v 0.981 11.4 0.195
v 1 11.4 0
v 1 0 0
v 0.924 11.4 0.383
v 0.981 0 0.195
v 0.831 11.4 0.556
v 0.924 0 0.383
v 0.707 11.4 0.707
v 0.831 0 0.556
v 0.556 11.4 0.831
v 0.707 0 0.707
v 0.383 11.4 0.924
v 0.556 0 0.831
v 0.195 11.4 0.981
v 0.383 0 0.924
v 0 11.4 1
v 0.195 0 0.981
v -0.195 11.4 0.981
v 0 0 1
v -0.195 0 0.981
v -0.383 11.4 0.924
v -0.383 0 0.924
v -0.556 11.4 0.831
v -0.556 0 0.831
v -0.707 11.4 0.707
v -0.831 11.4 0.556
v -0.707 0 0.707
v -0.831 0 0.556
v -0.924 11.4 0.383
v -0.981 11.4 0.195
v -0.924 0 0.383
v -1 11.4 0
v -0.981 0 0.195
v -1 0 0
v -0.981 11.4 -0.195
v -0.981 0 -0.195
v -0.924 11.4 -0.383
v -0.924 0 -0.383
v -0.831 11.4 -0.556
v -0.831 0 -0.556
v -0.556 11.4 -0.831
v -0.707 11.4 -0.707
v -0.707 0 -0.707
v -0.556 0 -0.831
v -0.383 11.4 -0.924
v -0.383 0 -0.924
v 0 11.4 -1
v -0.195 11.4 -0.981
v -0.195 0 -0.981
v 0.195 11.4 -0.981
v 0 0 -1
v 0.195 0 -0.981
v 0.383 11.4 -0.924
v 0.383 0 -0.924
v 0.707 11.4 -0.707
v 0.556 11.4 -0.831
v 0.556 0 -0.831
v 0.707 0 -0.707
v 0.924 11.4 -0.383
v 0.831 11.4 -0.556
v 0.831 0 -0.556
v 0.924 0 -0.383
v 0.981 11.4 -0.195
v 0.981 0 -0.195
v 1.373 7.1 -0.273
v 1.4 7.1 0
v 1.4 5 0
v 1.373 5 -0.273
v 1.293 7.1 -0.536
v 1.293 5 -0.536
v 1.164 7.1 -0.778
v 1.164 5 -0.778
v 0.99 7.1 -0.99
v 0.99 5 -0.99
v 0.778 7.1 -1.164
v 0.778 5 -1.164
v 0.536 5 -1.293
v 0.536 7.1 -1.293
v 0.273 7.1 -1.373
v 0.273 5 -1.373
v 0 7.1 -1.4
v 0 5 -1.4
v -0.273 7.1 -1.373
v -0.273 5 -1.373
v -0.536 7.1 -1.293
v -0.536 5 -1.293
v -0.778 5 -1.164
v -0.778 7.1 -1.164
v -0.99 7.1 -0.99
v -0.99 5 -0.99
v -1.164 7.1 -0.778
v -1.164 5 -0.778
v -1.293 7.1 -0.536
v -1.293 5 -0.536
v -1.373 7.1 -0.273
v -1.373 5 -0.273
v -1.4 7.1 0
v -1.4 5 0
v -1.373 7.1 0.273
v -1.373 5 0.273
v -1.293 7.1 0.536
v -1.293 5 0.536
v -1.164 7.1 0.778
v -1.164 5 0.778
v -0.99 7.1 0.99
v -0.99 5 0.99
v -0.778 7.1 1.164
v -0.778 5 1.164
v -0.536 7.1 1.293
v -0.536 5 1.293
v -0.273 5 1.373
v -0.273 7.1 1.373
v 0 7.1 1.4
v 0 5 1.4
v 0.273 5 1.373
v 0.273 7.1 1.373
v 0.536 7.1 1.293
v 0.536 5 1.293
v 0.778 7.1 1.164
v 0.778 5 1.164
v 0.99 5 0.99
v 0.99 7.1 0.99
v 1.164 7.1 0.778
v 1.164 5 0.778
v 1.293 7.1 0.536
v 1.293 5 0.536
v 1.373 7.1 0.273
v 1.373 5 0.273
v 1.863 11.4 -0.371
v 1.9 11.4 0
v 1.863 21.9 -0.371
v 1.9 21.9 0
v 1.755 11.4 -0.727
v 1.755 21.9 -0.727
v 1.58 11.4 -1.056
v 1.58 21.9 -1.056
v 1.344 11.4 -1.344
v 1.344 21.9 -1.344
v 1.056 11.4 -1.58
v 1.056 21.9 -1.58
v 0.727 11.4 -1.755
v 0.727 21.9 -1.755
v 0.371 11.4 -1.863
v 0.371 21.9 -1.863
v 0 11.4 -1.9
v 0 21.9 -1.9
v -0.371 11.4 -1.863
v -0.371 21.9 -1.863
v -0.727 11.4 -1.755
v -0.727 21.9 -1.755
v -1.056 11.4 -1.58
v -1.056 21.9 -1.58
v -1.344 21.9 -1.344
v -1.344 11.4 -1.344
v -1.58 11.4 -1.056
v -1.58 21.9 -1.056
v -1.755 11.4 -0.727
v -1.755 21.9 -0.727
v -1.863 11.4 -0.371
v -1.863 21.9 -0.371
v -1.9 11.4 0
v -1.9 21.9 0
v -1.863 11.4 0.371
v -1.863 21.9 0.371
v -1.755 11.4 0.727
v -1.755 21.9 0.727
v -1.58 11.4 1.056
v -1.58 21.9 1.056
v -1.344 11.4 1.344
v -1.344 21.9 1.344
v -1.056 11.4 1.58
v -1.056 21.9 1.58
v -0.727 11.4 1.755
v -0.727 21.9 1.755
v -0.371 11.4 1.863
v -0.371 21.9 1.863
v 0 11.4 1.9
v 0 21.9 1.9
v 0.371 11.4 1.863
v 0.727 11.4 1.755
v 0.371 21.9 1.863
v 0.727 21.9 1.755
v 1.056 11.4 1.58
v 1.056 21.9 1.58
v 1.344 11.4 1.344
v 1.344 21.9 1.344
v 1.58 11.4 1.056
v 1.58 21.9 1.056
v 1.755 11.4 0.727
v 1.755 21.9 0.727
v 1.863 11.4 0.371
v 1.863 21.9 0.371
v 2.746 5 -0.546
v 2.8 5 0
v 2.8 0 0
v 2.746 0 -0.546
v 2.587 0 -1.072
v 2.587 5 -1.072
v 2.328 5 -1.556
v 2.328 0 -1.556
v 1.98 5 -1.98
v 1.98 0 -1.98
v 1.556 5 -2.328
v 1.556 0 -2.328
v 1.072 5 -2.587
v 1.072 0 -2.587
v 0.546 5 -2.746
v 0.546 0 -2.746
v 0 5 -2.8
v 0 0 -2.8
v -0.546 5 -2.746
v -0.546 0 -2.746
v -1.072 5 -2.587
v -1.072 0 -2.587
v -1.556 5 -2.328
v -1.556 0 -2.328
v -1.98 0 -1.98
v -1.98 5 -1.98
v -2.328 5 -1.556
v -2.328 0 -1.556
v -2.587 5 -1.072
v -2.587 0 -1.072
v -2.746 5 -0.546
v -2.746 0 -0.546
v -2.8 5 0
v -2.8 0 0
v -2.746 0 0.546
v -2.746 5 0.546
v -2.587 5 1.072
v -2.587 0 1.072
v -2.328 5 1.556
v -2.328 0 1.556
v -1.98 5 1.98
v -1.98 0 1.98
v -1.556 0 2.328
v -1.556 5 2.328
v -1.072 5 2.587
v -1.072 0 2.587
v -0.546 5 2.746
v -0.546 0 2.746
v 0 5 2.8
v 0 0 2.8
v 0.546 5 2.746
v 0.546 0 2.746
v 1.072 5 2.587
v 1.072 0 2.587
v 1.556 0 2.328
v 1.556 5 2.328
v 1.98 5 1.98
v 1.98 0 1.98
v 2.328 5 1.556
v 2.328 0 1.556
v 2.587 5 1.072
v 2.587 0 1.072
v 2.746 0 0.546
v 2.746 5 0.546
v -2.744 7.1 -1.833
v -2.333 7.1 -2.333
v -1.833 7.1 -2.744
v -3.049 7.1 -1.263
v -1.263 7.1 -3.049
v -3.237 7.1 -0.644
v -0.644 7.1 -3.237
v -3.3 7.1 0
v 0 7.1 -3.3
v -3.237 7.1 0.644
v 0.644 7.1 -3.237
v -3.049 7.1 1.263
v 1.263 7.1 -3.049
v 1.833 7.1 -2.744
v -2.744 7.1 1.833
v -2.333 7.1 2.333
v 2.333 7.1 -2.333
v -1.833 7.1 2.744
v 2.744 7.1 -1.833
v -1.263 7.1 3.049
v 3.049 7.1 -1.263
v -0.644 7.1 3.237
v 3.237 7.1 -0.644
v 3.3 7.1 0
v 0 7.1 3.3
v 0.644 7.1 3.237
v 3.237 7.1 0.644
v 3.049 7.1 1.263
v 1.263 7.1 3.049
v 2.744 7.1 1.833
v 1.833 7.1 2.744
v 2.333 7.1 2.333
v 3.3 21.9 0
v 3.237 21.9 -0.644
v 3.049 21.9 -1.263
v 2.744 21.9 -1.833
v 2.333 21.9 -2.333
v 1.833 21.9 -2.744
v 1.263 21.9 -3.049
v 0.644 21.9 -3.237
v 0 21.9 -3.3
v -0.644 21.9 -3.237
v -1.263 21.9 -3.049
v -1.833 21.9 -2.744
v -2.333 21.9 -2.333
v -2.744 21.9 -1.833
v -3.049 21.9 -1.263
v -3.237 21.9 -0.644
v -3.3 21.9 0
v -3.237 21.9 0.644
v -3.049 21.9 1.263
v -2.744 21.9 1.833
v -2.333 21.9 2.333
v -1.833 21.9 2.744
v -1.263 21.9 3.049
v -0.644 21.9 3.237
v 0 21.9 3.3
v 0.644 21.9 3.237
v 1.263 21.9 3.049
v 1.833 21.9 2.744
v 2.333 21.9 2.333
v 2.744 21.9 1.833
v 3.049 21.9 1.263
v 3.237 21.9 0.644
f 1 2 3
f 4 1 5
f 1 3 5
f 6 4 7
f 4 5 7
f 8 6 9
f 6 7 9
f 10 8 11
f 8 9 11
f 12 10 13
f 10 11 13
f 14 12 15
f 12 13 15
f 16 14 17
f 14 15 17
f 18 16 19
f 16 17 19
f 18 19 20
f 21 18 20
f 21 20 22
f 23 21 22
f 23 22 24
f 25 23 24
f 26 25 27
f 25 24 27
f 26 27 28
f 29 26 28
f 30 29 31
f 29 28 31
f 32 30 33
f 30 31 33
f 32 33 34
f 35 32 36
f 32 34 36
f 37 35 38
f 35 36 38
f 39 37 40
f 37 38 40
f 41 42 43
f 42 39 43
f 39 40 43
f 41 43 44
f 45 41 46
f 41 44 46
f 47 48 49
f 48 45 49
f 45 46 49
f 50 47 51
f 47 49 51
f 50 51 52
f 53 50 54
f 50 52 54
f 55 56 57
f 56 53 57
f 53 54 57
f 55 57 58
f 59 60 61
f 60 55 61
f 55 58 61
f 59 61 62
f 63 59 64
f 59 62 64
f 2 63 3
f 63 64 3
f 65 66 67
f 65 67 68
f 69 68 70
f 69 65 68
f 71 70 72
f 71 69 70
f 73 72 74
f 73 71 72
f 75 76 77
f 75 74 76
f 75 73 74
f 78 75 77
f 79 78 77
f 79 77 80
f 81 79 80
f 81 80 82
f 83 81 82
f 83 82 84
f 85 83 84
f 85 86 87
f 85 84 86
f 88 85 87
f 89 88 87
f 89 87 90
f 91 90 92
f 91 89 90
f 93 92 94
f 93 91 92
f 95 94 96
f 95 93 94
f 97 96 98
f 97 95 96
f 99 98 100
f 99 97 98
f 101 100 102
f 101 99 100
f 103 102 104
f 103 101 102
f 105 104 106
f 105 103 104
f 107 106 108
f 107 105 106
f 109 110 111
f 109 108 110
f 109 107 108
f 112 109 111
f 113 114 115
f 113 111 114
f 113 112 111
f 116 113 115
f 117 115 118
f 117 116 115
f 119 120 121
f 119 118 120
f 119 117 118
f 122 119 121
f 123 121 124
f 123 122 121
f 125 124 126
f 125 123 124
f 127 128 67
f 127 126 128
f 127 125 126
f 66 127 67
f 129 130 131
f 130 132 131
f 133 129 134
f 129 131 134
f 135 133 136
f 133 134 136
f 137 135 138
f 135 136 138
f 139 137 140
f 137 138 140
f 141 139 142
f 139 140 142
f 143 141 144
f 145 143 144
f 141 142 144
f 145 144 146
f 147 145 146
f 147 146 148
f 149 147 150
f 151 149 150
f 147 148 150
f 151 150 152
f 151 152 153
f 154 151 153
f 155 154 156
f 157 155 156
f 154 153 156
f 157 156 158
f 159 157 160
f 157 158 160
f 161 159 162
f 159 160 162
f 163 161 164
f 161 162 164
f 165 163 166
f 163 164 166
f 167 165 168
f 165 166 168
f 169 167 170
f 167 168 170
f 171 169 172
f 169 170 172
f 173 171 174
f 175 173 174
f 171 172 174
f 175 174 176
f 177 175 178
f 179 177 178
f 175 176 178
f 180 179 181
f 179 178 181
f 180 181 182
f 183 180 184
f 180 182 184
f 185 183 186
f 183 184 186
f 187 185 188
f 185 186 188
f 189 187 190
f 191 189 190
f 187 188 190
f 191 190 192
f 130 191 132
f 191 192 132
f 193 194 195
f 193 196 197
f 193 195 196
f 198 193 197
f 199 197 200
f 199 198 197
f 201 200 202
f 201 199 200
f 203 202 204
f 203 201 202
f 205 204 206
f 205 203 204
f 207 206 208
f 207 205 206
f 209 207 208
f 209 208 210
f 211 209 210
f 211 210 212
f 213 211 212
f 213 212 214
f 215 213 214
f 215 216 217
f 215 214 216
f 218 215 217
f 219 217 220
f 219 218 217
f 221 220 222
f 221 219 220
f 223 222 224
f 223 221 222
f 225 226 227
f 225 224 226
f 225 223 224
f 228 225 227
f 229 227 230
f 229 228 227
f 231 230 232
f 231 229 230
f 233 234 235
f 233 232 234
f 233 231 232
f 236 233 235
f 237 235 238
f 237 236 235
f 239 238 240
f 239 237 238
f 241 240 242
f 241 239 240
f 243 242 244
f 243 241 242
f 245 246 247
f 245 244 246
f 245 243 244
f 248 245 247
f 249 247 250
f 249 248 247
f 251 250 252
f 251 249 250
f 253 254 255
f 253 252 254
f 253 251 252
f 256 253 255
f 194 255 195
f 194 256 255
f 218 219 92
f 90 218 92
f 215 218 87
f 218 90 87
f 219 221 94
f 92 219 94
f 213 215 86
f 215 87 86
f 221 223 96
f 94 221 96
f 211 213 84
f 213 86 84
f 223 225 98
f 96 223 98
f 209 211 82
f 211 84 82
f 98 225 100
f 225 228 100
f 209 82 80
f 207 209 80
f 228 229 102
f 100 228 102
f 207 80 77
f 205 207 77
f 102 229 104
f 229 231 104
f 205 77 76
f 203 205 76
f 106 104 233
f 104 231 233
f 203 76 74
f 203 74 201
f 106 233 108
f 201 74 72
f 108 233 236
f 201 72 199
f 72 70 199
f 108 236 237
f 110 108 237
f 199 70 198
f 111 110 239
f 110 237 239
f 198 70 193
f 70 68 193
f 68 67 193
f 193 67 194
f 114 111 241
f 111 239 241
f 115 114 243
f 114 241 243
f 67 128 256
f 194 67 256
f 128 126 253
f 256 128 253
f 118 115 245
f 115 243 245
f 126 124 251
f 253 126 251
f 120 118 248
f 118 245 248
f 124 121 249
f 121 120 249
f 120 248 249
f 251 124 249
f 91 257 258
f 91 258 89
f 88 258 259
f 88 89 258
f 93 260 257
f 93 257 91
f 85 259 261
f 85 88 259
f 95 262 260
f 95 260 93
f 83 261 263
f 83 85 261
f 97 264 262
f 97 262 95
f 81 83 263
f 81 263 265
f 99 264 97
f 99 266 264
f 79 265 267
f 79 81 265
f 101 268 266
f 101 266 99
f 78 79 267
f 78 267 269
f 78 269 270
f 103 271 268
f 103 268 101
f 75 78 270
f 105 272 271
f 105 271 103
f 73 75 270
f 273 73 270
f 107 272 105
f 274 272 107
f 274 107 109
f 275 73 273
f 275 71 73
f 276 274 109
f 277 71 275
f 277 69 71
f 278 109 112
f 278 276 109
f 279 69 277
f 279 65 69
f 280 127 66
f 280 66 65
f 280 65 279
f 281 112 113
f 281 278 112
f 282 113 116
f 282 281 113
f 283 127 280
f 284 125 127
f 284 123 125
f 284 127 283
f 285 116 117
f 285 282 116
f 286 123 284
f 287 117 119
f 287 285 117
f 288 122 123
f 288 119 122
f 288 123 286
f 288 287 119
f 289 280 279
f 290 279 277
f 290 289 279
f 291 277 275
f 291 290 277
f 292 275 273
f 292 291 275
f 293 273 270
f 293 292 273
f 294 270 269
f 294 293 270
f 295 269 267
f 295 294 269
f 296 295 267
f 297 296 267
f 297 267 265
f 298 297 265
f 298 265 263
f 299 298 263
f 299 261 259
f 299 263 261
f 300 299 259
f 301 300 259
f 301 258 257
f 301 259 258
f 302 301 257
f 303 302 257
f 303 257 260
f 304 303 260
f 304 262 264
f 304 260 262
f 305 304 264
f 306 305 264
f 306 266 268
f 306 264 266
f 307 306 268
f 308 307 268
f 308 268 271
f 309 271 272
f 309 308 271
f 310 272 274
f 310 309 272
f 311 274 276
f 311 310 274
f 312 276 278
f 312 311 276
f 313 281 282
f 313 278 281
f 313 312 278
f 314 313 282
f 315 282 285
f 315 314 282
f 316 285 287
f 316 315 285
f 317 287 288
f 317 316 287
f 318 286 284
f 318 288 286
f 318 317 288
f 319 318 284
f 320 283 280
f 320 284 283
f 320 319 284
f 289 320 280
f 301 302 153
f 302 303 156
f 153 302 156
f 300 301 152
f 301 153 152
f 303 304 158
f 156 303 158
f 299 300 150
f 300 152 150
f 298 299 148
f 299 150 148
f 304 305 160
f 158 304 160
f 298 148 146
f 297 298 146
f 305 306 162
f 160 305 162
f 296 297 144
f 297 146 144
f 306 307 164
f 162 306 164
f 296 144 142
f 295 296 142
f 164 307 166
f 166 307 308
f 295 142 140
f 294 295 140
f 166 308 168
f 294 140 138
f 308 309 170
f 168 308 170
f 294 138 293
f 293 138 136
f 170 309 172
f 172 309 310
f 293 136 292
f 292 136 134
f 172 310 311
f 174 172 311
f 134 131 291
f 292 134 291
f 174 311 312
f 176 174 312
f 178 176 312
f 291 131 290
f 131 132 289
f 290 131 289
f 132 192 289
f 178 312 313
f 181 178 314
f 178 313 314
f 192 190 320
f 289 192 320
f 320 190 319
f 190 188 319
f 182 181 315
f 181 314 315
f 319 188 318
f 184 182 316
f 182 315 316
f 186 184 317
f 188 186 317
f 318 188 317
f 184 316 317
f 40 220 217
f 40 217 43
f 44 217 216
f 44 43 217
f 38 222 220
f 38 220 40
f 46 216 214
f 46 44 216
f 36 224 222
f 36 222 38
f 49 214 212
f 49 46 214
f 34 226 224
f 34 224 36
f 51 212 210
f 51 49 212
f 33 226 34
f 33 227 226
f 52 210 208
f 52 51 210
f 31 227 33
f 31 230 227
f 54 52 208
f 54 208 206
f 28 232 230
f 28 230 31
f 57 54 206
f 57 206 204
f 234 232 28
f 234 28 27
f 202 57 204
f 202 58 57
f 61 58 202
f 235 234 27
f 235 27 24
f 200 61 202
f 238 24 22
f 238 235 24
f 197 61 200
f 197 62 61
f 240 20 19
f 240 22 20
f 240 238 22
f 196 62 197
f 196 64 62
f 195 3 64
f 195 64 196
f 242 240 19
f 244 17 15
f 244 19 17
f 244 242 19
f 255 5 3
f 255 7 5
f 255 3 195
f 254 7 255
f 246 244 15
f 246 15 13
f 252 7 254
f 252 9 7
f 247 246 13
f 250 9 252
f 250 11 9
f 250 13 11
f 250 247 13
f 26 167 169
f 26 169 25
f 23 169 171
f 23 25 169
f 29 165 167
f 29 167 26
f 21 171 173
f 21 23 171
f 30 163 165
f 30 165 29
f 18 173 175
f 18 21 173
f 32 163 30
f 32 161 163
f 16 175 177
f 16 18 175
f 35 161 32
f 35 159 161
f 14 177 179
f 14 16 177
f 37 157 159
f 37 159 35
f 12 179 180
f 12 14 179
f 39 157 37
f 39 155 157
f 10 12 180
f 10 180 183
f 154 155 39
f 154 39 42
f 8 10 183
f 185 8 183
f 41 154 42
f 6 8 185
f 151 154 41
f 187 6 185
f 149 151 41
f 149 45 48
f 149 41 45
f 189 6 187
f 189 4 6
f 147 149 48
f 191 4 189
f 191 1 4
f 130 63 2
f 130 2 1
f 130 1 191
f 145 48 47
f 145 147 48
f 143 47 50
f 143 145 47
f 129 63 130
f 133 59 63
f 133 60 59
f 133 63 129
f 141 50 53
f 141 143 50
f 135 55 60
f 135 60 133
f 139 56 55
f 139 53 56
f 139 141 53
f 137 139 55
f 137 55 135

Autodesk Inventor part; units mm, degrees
ref_plane "YZ Plane" through (0, 0, 0) normal (1, 0, 0) x (0, 1, 0)
ref_plane "XZ Plane" through (0, 0, 0) normal (0, 1, 0) x (-1, 0, 0)
ref_plane "XY Plane" through (0, 0, 0) normal (0, 0, 1) x (1, 0, 0)
sketch "Sketch1" plane through (0, 0, 0) normal (0, 0, 1) x (1, 0, 0)
  line L0 (0, 0) -> (2.8, 0)
  line L1 (2.8, 0) -> (2.8, 5)
  line L2 (2.8, 5) -> (1.4, 5)
  line L3 (1.4, 5) -> (1.4, 7.1)
  line L4 (1.4, 7.1) -> (3.3, 7.1)
  line L5 (3.3, 7.1) -> (3.3, 21.9)
  line L6 (3.3, 21.9) -> (0, 21.9)
  line L7 (0, 21.9) -> (0, 0)
  dimension "d0" = 2.8
  dimension "d1" = 5
  dimension "d2" = 1.4
  dimension "d3" = 2.1
  dimension "d4" = 3.3
  dimension "d5" = 14.8
revolve "Revolution1" add sketch "Sketch1" angle 360 about axis through (0, 21.9, 0) along (0, -1, 0)
thread "Thread1" size "M6x1" class "6g" standard "ANSI Metric M Profile" full length
sketch "Sketch2" plane through (0, 0, 0) normal (0, -1, 0) x (1, 0, 0)
  circle A0 centre (0, 0) radius 3.3 projected
  circle A1 centre (0, 0) radius 1
  dimension "d11" = 2
extrude "Extrusion1" cut sketch "Sketch2" against normal up to surface (21.9 mm away) contours A1
sketch "Sketch3" plane through (0, 21.9, 0) normal (0, 1, 0) x (1, 0, 0)
  circle A0 centre (0, 0) radius 1 projected
  circle A1 centre (0, 0) radius 3.3 projected
  circle A2 centre (0, 0) radius 1.9
  dimension "d14" = 3.8
extrude "Extrusion2" cut sketch "Sketch3" against normal blind 10.5 contours A2
properties part number "ChimeraHeatBreak" material "Stainless Steel"
